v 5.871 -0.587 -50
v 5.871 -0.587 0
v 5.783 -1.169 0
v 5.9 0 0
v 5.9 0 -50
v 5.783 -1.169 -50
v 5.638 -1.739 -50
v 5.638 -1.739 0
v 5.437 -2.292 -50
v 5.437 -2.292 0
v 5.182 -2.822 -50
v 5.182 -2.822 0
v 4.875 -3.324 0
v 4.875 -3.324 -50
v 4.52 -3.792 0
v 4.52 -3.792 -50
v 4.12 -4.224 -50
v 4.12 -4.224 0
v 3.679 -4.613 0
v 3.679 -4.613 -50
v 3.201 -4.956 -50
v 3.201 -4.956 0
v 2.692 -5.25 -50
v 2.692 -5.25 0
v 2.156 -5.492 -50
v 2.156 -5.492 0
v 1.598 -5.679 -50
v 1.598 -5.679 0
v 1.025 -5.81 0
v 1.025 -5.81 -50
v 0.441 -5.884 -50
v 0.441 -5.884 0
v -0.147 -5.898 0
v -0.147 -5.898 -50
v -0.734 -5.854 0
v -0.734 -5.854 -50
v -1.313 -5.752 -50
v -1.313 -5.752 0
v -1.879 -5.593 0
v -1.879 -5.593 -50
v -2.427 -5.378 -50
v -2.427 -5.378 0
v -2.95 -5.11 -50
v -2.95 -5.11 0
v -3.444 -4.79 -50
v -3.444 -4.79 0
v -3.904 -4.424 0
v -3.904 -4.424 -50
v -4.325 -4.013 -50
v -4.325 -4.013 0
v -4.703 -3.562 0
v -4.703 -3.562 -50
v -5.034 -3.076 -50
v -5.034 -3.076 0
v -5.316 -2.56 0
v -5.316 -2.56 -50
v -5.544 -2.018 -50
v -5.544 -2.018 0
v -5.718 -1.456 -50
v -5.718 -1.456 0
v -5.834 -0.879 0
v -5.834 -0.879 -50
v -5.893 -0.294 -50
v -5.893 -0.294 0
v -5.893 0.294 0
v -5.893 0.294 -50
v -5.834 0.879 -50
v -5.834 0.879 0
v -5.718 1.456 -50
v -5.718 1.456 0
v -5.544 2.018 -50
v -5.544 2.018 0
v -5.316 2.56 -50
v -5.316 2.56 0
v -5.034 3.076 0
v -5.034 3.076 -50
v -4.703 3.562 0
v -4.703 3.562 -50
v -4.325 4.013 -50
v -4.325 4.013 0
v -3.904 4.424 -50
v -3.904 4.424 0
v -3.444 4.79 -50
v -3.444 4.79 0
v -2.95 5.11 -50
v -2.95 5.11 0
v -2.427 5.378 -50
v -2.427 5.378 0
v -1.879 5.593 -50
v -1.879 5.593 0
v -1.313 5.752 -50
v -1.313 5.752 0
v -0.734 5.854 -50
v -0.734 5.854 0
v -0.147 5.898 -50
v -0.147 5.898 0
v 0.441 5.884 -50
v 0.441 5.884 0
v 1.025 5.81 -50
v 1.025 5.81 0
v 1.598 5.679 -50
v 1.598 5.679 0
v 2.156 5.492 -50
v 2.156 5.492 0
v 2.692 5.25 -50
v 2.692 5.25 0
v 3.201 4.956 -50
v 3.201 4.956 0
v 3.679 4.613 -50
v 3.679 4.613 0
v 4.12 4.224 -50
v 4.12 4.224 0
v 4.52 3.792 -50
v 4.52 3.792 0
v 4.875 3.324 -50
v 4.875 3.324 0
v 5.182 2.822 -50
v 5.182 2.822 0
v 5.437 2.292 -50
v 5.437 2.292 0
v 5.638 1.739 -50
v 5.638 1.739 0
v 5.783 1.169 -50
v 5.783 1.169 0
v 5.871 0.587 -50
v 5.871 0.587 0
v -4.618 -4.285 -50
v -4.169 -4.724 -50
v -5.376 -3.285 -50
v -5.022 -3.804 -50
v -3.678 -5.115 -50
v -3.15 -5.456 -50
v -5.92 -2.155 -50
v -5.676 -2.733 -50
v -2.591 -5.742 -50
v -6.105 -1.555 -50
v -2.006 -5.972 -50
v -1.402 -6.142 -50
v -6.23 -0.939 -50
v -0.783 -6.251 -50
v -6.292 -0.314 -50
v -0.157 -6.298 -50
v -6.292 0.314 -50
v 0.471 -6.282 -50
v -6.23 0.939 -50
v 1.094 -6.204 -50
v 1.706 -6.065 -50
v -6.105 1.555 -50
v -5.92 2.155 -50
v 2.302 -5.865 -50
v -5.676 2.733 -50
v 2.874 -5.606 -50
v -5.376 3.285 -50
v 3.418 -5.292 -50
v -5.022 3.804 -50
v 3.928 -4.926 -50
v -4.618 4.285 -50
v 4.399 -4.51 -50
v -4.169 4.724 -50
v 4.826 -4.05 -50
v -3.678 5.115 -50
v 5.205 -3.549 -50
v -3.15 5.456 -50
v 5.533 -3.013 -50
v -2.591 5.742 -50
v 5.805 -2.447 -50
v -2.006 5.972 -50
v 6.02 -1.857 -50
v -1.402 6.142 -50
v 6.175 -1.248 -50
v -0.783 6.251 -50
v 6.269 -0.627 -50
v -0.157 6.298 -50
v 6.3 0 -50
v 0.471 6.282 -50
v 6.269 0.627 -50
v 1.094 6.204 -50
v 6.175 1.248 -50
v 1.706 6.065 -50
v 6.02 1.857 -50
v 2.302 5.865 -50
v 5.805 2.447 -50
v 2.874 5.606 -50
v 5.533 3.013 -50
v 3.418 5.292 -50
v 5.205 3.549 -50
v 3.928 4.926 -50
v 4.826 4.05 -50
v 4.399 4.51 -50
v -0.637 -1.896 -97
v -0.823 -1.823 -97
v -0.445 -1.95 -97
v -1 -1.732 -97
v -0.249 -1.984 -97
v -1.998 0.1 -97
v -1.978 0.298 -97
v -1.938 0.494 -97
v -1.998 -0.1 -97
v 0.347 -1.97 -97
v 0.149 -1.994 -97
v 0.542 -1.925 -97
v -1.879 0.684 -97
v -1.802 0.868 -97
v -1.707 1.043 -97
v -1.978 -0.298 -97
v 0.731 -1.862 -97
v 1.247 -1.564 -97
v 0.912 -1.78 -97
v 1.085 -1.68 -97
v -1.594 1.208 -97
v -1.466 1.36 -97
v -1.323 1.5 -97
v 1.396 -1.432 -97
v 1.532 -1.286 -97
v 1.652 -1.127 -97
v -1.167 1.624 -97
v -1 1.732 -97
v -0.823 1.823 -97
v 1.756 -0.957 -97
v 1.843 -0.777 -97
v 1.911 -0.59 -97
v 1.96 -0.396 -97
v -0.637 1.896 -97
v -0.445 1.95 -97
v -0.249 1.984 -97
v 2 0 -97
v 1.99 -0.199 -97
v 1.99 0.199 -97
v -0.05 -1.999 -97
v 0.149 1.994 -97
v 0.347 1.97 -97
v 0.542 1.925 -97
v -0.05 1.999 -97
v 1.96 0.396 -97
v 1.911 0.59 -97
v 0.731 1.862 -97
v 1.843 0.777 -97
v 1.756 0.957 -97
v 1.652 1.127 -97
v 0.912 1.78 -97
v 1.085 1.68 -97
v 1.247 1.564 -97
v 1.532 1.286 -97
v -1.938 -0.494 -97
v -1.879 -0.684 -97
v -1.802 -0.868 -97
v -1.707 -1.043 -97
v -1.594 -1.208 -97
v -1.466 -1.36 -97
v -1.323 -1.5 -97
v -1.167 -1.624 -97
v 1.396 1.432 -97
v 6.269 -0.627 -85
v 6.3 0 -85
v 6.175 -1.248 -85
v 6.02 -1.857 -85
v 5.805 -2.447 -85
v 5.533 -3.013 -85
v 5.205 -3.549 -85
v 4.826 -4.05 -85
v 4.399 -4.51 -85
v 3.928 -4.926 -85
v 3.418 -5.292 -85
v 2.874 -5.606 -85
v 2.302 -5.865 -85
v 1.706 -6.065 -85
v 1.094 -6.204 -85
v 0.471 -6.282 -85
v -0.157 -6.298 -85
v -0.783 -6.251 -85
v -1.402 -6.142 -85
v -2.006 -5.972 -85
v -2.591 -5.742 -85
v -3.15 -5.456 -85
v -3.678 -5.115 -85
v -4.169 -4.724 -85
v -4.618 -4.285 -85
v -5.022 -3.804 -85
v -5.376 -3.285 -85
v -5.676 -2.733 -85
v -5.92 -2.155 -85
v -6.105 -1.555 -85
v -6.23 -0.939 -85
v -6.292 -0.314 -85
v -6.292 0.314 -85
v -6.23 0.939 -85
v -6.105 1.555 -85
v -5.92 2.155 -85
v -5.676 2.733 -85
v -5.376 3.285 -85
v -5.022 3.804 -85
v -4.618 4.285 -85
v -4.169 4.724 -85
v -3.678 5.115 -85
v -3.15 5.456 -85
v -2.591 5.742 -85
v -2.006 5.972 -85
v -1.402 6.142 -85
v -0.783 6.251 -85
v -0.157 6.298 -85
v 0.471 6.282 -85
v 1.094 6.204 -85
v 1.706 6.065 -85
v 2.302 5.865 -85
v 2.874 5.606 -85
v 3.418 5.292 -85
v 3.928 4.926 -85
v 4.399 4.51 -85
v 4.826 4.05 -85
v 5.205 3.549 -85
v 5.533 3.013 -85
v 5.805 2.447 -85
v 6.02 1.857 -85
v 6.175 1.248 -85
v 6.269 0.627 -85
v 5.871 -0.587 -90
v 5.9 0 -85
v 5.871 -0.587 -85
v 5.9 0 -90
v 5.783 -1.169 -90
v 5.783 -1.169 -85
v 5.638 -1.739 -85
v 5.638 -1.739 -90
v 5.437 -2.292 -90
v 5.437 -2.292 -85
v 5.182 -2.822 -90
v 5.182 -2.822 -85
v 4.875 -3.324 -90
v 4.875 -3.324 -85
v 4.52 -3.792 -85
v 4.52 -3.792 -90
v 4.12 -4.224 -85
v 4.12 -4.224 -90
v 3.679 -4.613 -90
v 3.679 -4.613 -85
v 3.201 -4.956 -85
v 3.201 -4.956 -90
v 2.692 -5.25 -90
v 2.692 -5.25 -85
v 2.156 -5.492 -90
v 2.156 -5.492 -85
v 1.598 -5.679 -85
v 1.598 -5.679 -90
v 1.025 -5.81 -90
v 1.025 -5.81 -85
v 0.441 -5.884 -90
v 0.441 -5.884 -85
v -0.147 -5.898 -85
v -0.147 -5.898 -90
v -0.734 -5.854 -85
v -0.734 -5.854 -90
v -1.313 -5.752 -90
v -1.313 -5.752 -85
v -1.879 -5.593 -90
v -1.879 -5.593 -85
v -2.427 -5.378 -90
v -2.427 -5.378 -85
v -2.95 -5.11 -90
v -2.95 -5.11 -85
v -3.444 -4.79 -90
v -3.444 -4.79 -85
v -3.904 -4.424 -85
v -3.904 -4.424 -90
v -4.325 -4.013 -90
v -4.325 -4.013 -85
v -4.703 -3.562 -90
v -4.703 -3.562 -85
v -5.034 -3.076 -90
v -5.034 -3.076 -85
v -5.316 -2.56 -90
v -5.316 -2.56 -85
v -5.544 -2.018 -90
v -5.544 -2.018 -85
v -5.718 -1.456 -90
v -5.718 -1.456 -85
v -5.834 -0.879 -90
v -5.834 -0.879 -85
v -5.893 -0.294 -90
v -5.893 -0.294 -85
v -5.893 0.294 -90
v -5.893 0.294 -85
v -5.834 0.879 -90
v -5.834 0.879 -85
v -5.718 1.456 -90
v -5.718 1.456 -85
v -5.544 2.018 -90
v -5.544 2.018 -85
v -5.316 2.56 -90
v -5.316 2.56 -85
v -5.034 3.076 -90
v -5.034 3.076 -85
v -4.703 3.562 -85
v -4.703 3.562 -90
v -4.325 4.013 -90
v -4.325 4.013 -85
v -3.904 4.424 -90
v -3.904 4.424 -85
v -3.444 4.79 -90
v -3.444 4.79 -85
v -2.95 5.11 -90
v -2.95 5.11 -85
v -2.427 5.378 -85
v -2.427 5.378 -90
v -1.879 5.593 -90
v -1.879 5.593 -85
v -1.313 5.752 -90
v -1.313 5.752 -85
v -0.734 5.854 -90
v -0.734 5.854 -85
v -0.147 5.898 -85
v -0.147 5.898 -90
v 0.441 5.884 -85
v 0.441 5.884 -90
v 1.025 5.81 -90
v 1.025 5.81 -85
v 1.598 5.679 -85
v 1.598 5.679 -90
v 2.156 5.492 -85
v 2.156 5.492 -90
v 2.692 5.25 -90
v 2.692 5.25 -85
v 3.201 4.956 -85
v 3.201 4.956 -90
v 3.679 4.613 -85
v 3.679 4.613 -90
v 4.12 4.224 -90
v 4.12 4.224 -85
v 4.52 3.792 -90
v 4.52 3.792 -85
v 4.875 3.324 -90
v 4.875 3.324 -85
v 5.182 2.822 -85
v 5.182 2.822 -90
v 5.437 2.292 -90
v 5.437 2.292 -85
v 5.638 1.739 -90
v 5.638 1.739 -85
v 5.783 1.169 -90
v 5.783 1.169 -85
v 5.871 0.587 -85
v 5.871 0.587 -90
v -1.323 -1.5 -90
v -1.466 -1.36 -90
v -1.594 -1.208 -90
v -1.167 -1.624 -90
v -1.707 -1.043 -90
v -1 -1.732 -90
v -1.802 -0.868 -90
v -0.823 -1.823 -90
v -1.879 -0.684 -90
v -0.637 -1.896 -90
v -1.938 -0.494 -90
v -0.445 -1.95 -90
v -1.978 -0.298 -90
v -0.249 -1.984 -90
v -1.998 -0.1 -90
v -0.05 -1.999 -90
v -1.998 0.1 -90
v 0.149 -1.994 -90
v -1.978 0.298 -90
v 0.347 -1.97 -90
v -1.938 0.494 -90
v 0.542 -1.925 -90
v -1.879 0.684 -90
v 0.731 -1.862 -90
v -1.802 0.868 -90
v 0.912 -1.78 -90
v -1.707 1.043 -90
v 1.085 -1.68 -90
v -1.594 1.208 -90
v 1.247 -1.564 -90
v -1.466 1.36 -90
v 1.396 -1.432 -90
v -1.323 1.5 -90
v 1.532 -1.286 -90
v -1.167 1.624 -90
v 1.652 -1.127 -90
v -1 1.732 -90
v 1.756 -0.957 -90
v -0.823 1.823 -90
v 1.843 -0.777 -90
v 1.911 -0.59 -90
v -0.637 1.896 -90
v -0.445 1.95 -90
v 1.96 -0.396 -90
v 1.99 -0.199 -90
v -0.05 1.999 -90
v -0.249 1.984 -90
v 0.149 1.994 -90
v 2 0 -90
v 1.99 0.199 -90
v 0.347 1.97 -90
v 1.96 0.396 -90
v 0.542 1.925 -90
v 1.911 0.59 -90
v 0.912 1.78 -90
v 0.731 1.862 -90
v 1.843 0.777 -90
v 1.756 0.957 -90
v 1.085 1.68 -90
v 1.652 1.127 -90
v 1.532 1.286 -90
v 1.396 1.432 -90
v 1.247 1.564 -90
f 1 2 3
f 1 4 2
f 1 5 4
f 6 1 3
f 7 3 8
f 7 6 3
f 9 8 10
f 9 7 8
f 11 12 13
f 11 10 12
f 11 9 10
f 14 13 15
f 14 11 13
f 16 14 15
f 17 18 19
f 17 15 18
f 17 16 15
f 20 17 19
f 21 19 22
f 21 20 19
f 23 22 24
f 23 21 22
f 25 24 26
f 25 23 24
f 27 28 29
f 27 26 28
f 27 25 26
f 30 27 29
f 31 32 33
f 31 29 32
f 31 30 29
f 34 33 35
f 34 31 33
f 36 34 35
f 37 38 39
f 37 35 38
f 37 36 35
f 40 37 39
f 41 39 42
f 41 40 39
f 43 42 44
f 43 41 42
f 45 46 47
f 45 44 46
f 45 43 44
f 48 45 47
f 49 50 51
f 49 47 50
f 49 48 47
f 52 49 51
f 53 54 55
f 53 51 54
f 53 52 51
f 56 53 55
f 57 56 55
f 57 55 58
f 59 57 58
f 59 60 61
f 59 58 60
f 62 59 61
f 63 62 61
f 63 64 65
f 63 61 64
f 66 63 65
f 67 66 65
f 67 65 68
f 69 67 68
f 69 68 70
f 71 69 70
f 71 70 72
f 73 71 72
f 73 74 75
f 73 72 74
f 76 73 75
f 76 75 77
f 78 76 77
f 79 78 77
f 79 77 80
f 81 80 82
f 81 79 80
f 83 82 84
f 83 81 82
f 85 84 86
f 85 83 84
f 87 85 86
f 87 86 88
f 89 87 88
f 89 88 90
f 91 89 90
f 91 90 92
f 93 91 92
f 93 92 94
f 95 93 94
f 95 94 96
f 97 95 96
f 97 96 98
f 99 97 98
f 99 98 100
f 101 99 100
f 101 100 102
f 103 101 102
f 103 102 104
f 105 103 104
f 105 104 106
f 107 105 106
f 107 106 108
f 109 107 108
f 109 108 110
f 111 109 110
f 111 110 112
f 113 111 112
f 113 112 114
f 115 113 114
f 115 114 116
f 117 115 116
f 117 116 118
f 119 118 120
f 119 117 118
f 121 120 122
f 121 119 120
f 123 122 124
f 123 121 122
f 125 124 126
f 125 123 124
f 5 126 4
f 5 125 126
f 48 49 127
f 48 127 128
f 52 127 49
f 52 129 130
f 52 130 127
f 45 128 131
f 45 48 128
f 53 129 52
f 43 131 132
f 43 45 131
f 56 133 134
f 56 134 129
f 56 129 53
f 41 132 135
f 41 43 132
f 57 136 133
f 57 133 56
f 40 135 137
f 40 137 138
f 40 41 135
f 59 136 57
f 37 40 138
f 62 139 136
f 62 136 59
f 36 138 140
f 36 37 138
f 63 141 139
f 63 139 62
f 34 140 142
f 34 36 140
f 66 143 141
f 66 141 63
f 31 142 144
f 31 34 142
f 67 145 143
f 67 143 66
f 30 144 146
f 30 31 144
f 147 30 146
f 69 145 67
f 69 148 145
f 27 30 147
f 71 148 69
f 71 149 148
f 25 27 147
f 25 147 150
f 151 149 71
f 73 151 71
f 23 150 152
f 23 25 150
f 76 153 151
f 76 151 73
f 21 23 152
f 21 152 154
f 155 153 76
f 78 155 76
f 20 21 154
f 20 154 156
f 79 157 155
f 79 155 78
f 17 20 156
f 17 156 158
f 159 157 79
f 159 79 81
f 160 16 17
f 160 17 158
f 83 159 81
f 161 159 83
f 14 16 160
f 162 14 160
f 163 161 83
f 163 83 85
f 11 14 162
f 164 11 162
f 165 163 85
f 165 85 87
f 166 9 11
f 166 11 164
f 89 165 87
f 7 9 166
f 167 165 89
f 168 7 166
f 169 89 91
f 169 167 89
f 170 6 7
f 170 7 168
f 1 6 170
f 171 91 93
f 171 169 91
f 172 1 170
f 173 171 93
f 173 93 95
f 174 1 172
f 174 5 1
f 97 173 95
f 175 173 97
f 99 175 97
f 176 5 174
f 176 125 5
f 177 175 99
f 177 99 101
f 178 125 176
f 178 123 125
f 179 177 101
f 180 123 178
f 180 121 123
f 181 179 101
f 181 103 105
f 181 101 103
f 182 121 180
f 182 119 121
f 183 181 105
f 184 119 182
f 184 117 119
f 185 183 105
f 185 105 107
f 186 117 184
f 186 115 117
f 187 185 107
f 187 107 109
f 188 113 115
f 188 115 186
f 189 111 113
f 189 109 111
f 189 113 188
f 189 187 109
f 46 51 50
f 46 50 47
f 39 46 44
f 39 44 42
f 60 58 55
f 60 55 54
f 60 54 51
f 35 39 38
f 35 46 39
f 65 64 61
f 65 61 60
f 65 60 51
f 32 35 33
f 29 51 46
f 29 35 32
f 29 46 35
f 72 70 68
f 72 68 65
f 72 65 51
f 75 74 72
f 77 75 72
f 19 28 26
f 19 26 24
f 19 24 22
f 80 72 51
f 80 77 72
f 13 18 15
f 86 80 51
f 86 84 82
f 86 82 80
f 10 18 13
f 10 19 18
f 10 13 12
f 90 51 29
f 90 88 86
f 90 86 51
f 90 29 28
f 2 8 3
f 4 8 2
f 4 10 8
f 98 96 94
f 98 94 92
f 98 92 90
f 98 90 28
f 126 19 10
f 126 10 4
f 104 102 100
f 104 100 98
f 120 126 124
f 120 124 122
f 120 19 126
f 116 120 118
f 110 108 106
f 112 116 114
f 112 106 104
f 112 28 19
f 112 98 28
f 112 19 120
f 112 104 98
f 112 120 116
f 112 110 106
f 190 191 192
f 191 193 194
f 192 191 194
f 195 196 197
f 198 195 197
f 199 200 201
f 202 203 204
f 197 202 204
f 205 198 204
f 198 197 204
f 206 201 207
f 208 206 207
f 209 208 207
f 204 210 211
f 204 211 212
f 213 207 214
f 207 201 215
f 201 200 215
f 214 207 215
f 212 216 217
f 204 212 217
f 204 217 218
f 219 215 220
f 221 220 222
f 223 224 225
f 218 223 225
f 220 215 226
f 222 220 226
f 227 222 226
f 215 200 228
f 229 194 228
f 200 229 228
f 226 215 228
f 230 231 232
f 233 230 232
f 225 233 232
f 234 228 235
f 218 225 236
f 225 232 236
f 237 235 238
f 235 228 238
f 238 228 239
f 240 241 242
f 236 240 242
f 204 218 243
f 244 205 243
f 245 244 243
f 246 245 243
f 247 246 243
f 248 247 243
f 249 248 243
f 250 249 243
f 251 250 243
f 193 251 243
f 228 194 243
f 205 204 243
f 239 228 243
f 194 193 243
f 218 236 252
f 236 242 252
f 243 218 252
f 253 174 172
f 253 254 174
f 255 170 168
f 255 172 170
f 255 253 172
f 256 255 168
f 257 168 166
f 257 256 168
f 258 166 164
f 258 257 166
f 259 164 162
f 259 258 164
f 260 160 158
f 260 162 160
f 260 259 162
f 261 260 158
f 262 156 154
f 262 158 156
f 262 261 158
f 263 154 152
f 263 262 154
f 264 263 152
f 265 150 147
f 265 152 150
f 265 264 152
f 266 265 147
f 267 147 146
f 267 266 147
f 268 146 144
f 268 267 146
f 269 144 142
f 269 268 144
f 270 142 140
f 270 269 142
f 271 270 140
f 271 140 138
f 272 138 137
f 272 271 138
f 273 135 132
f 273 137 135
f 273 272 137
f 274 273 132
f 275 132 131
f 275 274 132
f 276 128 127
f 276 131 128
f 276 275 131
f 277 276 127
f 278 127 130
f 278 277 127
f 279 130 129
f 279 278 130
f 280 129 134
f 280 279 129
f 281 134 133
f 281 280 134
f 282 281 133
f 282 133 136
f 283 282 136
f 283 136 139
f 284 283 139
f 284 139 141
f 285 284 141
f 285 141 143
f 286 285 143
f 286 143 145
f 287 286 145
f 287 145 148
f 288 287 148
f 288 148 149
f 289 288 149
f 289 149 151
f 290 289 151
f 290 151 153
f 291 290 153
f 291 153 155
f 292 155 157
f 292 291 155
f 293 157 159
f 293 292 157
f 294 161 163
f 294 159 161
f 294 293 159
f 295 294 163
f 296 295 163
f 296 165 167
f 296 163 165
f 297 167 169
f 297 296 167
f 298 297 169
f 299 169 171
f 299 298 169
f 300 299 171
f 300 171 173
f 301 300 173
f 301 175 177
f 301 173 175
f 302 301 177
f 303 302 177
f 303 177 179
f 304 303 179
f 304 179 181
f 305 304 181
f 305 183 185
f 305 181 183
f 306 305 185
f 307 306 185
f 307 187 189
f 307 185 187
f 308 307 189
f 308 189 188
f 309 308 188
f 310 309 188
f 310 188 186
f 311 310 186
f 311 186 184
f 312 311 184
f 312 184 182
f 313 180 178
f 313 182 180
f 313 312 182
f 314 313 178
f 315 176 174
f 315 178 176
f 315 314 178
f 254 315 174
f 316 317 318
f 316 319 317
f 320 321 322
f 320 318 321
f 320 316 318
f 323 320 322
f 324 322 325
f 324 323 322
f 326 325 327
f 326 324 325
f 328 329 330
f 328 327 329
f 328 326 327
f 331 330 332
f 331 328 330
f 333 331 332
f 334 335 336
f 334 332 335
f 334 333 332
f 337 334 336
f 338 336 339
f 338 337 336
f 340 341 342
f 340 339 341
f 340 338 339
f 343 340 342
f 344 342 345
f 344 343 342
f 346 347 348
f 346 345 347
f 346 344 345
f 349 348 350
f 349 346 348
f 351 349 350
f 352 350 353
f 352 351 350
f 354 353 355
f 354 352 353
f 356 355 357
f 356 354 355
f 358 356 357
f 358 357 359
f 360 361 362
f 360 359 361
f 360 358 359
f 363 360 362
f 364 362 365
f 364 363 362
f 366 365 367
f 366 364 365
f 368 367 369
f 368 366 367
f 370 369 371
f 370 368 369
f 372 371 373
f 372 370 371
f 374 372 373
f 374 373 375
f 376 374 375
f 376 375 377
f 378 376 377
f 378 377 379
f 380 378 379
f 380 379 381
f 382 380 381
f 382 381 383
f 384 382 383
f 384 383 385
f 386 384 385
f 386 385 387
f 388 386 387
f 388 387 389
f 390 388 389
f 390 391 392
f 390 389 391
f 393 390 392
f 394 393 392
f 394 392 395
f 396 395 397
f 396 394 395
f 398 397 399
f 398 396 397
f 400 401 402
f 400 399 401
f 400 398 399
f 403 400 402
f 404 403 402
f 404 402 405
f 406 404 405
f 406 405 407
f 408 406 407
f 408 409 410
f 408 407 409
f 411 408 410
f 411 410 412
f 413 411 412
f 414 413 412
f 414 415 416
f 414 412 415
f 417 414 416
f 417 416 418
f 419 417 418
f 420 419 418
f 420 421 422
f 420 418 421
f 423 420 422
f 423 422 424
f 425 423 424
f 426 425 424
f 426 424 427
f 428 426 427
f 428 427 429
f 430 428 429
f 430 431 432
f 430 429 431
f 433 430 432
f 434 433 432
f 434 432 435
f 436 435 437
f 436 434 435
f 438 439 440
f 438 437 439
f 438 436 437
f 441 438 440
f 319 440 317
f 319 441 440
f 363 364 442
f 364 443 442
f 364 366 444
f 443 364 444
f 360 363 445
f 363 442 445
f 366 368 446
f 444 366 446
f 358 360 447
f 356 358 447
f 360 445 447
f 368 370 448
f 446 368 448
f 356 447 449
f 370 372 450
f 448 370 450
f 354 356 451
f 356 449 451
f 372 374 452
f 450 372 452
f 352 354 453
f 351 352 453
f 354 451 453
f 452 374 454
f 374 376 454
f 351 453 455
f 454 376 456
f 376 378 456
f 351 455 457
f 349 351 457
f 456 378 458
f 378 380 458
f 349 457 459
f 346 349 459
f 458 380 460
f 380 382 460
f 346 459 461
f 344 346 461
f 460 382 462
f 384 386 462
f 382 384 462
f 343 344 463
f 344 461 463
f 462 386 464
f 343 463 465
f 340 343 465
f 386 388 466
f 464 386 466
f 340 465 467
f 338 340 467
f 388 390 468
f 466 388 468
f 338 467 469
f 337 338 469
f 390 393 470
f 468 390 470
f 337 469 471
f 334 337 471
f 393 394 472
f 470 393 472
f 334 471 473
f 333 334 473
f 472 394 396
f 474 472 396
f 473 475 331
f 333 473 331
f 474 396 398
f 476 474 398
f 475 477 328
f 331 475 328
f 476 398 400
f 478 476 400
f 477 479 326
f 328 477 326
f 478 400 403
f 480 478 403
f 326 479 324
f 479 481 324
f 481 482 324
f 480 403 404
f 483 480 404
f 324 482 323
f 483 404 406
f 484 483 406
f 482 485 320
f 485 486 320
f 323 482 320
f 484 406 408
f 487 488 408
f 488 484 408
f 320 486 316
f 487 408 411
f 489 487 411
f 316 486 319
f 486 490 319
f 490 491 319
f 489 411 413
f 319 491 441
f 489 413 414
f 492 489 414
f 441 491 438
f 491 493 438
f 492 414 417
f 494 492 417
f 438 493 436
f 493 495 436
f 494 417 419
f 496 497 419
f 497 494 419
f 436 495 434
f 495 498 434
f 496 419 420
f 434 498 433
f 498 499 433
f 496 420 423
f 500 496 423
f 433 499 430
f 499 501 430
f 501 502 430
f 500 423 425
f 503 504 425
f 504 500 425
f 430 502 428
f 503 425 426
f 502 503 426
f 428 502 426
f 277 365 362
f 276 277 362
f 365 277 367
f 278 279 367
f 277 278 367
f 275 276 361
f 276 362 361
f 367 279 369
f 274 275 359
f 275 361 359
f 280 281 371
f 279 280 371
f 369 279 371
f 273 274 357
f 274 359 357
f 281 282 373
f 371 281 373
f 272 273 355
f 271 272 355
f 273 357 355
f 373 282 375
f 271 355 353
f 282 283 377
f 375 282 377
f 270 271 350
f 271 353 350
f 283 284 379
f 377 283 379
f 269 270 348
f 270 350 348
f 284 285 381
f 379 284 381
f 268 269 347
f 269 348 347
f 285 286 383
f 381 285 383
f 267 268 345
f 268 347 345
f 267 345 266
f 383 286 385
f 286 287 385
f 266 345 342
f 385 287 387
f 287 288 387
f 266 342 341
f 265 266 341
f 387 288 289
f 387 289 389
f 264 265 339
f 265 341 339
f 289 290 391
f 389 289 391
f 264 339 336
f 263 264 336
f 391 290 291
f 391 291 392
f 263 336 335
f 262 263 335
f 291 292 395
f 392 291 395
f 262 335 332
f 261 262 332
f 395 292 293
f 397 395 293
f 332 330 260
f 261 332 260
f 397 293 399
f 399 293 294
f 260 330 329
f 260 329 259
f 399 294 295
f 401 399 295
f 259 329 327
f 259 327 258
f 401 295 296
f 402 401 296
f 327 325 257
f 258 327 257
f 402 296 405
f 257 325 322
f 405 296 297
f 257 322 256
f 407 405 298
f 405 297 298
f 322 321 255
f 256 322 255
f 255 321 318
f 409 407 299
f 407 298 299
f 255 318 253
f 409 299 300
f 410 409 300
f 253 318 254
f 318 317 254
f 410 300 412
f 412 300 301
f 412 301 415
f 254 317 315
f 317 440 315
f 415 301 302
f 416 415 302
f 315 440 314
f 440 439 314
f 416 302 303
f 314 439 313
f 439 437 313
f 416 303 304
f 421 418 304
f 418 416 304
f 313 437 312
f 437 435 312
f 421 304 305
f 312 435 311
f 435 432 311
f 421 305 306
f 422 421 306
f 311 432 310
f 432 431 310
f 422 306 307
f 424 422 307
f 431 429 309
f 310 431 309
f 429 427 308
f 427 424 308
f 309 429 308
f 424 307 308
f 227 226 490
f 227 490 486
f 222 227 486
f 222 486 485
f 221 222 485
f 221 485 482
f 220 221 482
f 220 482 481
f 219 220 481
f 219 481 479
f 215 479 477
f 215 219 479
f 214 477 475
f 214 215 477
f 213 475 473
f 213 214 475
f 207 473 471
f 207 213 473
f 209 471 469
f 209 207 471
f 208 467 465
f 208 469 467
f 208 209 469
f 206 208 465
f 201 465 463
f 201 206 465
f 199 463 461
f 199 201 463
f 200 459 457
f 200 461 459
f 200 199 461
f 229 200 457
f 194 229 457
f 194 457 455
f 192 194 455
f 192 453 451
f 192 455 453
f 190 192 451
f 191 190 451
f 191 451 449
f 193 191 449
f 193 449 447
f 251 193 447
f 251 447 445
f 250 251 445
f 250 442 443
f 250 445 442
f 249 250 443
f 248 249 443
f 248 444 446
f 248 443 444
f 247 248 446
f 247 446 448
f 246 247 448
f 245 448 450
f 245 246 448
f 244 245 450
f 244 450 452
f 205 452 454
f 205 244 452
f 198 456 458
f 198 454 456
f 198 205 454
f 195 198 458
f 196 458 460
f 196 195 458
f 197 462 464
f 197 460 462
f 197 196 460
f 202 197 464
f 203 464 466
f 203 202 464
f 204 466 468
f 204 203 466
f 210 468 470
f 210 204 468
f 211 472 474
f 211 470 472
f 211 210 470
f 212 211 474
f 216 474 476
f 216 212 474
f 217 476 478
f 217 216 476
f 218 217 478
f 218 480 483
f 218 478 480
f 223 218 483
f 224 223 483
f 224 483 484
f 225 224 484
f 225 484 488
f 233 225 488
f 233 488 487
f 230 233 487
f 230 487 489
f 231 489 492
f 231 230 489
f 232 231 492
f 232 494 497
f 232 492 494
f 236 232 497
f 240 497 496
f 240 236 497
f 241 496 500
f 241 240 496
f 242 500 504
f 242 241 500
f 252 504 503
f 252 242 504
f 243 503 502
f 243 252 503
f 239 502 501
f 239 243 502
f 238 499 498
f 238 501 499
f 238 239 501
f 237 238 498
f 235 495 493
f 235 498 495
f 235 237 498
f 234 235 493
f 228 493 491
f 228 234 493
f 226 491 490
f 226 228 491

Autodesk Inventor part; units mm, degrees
ref_plane "YZ Plane" through (0, 0, 0) normal (1, 0, 0) x (0, 1, 0)
ref_plane "XZ Plane" through (0, 0, 0) normal (0, 1, 0) x (-1, 0, 0)
ref_plane "XY Plane" through (0, 0, 0) normal (0, 0, 1) x (1, 0, 0)
sketch "Sketch1" plane through (0, 0, 0) normal (0, 1, 0) x (-1, 0, 0)
  line L0 (0, 0) -> (-5.9, 0)
  line L1 (-5.9, 0) -> (-5.9, -50)
  line L2 (-5.9, -50) -> (-6.3, -50)
  line L3 (-6.3, -50) -> (-6.3, -85)
  line L4 (-6.3, -85) -> (-5.9, -85)
  line L5 (-5.9, -85) -> (-5.9, -90)
  line L6 (-5.9, -90) -> (-2, -90)
  line L7 (-2, -90) -> (-2, -97)
  line L8 (-2, -97) -> (0, -97)
  line L9 (0, -97) -> (0, 0)
  dimension "d1" = 5.9
  dimension "d2" = 50
  dimension "d3" = 7
  dimension "d4" = 5
  dimension "d5" = 35
  dimension "d7" = 6.3
  dimension "d8" = 2
revolve "Revolution1" add sketch "Sketch1" angle 360 about axis through (0, 0, -97) along (0, 0, 1)
thread "Thread1" size "M4x0.7" class "6g" standard "ANSI Metric M Profile" full length
properties part number "holdingRod"
